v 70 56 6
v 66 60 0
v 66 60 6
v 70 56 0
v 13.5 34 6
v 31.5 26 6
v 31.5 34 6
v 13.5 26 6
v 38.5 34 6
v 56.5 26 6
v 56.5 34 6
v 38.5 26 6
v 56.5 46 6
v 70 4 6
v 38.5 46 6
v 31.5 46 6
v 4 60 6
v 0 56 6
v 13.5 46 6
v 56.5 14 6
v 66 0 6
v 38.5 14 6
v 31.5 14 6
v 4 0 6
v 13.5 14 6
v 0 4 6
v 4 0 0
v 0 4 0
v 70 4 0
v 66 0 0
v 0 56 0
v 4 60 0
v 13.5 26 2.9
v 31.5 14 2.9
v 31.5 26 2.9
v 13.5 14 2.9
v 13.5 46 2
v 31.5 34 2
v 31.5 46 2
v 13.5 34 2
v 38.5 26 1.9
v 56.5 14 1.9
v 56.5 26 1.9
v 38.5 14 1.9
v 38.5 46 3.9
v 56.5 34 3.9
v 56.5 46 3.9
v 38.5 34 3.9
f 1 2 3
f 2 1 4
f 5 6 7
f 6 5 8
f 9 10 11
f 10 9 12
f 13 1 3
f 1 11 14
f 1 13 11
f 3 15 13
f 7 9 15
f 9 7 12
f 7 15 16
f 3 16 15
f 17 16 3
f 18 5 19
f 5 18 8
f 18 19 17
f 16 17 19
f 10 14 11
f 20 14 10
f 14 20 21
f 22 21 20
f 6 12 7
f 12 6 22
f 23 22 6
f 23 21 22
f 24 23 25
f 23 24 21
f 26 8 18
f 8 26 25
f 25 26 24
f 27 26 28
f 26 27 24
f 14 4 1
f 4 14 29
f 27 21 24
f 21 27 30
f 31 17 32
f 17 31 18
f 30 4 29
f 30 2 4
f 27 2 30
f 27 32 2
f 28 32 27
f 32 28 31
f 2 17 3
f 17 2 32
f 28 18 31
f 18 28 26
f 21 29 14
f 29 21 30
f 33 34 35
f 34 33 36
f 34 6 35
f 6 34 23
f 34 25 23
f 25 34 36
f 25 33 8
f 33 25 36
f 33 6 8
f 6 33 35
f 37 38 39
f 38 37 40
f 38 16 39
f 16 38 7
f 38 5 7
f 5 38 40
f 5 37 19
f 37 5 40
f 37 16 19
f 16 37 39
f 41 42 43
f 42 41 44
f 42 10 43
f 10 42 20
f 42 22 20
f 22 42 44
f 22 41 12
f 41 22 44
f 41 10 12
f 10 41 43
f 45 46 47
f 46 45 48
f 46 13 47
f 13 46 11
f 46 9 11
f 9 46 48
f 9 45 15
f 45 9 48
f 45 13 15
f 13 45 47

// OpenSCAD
$fn = 32;

// ----------------------------------------------------------------------
// Windowed plate: 4 voids, 70 x 60 x 6 mm
// ----------------------------------------------------------------------

// --- parameters (mm) ---
plate_l = 70;             // plate length, X
plate_w = 60;             // plate width, Y
plate_t = 6;              // plate thickness, Z
edge_margin = 10;         // wall from the plate edge to any window
win_l = 18;               // pocket length
win_w = 12;               // pocket width
pitch_x = 25;             // grid pitch along X
pitch_y = 20;             // grid pitch along Y
depth_1 = 3.1;            // depth of void 1 (full thickness = through)
depth_2 = 4;              // depth of void 2 (full thickness = through)
depth_3 = 4.1;            // depth of void 3 (full thickness = through)
depth_4 = 2.1;            // depth of void 4 (full thickness = through)
corner_c = 4;             // corner chamfer of the plate

profile = [[4, 0], [66, 0], [70, 4], [70, 56], [66, 60], [4, 60], [0, 56], [0, 4]];  // primary outline, 8 points, counter clockwise
void_1 = [[13.5, 14], [31.5, 14], [31.5, 26], [13.5, 26]];  // pocket at grid node 0,0, 4 points
void_2 = [[13.5, 34], [31.5, 34], [31.5, 46], [13.5, 46]];  // pocket at grid node 0,1, 4 points
void_3 = [[38.5, 14], [56.5, 14], [56.5, 26], [38.5, 26]];  // pocket at grid node 1,0, 4 points
void_4 = [[38.5, 34], [56.5, 34], [56.5, 46], [38.5, 46]];  // pocket at grid node 1,1, 4 points

// --- the one profile operation ---
difference() {
  linear_extrude(height = plate_t) polygon(points = profile);
  translate([0, 0, plate_t - depth_1])
    linear_extrude(height = depth_1 + 1) polygon(points = void_1);
  translate([0, 0, plate_t - depth_2])
    linear_extrude(height = depth_2 + 1) polygon(points = void_2);
  translate([0, 0, plate_t - depth_3])
    linear_extrude(height = depth_3 + 1) polygon(points = void_3);
  translate([0, 0, plate_t - depth_4])
    linear_extrude(height = depth_4 + 1) polygon(points = void_4);
}
